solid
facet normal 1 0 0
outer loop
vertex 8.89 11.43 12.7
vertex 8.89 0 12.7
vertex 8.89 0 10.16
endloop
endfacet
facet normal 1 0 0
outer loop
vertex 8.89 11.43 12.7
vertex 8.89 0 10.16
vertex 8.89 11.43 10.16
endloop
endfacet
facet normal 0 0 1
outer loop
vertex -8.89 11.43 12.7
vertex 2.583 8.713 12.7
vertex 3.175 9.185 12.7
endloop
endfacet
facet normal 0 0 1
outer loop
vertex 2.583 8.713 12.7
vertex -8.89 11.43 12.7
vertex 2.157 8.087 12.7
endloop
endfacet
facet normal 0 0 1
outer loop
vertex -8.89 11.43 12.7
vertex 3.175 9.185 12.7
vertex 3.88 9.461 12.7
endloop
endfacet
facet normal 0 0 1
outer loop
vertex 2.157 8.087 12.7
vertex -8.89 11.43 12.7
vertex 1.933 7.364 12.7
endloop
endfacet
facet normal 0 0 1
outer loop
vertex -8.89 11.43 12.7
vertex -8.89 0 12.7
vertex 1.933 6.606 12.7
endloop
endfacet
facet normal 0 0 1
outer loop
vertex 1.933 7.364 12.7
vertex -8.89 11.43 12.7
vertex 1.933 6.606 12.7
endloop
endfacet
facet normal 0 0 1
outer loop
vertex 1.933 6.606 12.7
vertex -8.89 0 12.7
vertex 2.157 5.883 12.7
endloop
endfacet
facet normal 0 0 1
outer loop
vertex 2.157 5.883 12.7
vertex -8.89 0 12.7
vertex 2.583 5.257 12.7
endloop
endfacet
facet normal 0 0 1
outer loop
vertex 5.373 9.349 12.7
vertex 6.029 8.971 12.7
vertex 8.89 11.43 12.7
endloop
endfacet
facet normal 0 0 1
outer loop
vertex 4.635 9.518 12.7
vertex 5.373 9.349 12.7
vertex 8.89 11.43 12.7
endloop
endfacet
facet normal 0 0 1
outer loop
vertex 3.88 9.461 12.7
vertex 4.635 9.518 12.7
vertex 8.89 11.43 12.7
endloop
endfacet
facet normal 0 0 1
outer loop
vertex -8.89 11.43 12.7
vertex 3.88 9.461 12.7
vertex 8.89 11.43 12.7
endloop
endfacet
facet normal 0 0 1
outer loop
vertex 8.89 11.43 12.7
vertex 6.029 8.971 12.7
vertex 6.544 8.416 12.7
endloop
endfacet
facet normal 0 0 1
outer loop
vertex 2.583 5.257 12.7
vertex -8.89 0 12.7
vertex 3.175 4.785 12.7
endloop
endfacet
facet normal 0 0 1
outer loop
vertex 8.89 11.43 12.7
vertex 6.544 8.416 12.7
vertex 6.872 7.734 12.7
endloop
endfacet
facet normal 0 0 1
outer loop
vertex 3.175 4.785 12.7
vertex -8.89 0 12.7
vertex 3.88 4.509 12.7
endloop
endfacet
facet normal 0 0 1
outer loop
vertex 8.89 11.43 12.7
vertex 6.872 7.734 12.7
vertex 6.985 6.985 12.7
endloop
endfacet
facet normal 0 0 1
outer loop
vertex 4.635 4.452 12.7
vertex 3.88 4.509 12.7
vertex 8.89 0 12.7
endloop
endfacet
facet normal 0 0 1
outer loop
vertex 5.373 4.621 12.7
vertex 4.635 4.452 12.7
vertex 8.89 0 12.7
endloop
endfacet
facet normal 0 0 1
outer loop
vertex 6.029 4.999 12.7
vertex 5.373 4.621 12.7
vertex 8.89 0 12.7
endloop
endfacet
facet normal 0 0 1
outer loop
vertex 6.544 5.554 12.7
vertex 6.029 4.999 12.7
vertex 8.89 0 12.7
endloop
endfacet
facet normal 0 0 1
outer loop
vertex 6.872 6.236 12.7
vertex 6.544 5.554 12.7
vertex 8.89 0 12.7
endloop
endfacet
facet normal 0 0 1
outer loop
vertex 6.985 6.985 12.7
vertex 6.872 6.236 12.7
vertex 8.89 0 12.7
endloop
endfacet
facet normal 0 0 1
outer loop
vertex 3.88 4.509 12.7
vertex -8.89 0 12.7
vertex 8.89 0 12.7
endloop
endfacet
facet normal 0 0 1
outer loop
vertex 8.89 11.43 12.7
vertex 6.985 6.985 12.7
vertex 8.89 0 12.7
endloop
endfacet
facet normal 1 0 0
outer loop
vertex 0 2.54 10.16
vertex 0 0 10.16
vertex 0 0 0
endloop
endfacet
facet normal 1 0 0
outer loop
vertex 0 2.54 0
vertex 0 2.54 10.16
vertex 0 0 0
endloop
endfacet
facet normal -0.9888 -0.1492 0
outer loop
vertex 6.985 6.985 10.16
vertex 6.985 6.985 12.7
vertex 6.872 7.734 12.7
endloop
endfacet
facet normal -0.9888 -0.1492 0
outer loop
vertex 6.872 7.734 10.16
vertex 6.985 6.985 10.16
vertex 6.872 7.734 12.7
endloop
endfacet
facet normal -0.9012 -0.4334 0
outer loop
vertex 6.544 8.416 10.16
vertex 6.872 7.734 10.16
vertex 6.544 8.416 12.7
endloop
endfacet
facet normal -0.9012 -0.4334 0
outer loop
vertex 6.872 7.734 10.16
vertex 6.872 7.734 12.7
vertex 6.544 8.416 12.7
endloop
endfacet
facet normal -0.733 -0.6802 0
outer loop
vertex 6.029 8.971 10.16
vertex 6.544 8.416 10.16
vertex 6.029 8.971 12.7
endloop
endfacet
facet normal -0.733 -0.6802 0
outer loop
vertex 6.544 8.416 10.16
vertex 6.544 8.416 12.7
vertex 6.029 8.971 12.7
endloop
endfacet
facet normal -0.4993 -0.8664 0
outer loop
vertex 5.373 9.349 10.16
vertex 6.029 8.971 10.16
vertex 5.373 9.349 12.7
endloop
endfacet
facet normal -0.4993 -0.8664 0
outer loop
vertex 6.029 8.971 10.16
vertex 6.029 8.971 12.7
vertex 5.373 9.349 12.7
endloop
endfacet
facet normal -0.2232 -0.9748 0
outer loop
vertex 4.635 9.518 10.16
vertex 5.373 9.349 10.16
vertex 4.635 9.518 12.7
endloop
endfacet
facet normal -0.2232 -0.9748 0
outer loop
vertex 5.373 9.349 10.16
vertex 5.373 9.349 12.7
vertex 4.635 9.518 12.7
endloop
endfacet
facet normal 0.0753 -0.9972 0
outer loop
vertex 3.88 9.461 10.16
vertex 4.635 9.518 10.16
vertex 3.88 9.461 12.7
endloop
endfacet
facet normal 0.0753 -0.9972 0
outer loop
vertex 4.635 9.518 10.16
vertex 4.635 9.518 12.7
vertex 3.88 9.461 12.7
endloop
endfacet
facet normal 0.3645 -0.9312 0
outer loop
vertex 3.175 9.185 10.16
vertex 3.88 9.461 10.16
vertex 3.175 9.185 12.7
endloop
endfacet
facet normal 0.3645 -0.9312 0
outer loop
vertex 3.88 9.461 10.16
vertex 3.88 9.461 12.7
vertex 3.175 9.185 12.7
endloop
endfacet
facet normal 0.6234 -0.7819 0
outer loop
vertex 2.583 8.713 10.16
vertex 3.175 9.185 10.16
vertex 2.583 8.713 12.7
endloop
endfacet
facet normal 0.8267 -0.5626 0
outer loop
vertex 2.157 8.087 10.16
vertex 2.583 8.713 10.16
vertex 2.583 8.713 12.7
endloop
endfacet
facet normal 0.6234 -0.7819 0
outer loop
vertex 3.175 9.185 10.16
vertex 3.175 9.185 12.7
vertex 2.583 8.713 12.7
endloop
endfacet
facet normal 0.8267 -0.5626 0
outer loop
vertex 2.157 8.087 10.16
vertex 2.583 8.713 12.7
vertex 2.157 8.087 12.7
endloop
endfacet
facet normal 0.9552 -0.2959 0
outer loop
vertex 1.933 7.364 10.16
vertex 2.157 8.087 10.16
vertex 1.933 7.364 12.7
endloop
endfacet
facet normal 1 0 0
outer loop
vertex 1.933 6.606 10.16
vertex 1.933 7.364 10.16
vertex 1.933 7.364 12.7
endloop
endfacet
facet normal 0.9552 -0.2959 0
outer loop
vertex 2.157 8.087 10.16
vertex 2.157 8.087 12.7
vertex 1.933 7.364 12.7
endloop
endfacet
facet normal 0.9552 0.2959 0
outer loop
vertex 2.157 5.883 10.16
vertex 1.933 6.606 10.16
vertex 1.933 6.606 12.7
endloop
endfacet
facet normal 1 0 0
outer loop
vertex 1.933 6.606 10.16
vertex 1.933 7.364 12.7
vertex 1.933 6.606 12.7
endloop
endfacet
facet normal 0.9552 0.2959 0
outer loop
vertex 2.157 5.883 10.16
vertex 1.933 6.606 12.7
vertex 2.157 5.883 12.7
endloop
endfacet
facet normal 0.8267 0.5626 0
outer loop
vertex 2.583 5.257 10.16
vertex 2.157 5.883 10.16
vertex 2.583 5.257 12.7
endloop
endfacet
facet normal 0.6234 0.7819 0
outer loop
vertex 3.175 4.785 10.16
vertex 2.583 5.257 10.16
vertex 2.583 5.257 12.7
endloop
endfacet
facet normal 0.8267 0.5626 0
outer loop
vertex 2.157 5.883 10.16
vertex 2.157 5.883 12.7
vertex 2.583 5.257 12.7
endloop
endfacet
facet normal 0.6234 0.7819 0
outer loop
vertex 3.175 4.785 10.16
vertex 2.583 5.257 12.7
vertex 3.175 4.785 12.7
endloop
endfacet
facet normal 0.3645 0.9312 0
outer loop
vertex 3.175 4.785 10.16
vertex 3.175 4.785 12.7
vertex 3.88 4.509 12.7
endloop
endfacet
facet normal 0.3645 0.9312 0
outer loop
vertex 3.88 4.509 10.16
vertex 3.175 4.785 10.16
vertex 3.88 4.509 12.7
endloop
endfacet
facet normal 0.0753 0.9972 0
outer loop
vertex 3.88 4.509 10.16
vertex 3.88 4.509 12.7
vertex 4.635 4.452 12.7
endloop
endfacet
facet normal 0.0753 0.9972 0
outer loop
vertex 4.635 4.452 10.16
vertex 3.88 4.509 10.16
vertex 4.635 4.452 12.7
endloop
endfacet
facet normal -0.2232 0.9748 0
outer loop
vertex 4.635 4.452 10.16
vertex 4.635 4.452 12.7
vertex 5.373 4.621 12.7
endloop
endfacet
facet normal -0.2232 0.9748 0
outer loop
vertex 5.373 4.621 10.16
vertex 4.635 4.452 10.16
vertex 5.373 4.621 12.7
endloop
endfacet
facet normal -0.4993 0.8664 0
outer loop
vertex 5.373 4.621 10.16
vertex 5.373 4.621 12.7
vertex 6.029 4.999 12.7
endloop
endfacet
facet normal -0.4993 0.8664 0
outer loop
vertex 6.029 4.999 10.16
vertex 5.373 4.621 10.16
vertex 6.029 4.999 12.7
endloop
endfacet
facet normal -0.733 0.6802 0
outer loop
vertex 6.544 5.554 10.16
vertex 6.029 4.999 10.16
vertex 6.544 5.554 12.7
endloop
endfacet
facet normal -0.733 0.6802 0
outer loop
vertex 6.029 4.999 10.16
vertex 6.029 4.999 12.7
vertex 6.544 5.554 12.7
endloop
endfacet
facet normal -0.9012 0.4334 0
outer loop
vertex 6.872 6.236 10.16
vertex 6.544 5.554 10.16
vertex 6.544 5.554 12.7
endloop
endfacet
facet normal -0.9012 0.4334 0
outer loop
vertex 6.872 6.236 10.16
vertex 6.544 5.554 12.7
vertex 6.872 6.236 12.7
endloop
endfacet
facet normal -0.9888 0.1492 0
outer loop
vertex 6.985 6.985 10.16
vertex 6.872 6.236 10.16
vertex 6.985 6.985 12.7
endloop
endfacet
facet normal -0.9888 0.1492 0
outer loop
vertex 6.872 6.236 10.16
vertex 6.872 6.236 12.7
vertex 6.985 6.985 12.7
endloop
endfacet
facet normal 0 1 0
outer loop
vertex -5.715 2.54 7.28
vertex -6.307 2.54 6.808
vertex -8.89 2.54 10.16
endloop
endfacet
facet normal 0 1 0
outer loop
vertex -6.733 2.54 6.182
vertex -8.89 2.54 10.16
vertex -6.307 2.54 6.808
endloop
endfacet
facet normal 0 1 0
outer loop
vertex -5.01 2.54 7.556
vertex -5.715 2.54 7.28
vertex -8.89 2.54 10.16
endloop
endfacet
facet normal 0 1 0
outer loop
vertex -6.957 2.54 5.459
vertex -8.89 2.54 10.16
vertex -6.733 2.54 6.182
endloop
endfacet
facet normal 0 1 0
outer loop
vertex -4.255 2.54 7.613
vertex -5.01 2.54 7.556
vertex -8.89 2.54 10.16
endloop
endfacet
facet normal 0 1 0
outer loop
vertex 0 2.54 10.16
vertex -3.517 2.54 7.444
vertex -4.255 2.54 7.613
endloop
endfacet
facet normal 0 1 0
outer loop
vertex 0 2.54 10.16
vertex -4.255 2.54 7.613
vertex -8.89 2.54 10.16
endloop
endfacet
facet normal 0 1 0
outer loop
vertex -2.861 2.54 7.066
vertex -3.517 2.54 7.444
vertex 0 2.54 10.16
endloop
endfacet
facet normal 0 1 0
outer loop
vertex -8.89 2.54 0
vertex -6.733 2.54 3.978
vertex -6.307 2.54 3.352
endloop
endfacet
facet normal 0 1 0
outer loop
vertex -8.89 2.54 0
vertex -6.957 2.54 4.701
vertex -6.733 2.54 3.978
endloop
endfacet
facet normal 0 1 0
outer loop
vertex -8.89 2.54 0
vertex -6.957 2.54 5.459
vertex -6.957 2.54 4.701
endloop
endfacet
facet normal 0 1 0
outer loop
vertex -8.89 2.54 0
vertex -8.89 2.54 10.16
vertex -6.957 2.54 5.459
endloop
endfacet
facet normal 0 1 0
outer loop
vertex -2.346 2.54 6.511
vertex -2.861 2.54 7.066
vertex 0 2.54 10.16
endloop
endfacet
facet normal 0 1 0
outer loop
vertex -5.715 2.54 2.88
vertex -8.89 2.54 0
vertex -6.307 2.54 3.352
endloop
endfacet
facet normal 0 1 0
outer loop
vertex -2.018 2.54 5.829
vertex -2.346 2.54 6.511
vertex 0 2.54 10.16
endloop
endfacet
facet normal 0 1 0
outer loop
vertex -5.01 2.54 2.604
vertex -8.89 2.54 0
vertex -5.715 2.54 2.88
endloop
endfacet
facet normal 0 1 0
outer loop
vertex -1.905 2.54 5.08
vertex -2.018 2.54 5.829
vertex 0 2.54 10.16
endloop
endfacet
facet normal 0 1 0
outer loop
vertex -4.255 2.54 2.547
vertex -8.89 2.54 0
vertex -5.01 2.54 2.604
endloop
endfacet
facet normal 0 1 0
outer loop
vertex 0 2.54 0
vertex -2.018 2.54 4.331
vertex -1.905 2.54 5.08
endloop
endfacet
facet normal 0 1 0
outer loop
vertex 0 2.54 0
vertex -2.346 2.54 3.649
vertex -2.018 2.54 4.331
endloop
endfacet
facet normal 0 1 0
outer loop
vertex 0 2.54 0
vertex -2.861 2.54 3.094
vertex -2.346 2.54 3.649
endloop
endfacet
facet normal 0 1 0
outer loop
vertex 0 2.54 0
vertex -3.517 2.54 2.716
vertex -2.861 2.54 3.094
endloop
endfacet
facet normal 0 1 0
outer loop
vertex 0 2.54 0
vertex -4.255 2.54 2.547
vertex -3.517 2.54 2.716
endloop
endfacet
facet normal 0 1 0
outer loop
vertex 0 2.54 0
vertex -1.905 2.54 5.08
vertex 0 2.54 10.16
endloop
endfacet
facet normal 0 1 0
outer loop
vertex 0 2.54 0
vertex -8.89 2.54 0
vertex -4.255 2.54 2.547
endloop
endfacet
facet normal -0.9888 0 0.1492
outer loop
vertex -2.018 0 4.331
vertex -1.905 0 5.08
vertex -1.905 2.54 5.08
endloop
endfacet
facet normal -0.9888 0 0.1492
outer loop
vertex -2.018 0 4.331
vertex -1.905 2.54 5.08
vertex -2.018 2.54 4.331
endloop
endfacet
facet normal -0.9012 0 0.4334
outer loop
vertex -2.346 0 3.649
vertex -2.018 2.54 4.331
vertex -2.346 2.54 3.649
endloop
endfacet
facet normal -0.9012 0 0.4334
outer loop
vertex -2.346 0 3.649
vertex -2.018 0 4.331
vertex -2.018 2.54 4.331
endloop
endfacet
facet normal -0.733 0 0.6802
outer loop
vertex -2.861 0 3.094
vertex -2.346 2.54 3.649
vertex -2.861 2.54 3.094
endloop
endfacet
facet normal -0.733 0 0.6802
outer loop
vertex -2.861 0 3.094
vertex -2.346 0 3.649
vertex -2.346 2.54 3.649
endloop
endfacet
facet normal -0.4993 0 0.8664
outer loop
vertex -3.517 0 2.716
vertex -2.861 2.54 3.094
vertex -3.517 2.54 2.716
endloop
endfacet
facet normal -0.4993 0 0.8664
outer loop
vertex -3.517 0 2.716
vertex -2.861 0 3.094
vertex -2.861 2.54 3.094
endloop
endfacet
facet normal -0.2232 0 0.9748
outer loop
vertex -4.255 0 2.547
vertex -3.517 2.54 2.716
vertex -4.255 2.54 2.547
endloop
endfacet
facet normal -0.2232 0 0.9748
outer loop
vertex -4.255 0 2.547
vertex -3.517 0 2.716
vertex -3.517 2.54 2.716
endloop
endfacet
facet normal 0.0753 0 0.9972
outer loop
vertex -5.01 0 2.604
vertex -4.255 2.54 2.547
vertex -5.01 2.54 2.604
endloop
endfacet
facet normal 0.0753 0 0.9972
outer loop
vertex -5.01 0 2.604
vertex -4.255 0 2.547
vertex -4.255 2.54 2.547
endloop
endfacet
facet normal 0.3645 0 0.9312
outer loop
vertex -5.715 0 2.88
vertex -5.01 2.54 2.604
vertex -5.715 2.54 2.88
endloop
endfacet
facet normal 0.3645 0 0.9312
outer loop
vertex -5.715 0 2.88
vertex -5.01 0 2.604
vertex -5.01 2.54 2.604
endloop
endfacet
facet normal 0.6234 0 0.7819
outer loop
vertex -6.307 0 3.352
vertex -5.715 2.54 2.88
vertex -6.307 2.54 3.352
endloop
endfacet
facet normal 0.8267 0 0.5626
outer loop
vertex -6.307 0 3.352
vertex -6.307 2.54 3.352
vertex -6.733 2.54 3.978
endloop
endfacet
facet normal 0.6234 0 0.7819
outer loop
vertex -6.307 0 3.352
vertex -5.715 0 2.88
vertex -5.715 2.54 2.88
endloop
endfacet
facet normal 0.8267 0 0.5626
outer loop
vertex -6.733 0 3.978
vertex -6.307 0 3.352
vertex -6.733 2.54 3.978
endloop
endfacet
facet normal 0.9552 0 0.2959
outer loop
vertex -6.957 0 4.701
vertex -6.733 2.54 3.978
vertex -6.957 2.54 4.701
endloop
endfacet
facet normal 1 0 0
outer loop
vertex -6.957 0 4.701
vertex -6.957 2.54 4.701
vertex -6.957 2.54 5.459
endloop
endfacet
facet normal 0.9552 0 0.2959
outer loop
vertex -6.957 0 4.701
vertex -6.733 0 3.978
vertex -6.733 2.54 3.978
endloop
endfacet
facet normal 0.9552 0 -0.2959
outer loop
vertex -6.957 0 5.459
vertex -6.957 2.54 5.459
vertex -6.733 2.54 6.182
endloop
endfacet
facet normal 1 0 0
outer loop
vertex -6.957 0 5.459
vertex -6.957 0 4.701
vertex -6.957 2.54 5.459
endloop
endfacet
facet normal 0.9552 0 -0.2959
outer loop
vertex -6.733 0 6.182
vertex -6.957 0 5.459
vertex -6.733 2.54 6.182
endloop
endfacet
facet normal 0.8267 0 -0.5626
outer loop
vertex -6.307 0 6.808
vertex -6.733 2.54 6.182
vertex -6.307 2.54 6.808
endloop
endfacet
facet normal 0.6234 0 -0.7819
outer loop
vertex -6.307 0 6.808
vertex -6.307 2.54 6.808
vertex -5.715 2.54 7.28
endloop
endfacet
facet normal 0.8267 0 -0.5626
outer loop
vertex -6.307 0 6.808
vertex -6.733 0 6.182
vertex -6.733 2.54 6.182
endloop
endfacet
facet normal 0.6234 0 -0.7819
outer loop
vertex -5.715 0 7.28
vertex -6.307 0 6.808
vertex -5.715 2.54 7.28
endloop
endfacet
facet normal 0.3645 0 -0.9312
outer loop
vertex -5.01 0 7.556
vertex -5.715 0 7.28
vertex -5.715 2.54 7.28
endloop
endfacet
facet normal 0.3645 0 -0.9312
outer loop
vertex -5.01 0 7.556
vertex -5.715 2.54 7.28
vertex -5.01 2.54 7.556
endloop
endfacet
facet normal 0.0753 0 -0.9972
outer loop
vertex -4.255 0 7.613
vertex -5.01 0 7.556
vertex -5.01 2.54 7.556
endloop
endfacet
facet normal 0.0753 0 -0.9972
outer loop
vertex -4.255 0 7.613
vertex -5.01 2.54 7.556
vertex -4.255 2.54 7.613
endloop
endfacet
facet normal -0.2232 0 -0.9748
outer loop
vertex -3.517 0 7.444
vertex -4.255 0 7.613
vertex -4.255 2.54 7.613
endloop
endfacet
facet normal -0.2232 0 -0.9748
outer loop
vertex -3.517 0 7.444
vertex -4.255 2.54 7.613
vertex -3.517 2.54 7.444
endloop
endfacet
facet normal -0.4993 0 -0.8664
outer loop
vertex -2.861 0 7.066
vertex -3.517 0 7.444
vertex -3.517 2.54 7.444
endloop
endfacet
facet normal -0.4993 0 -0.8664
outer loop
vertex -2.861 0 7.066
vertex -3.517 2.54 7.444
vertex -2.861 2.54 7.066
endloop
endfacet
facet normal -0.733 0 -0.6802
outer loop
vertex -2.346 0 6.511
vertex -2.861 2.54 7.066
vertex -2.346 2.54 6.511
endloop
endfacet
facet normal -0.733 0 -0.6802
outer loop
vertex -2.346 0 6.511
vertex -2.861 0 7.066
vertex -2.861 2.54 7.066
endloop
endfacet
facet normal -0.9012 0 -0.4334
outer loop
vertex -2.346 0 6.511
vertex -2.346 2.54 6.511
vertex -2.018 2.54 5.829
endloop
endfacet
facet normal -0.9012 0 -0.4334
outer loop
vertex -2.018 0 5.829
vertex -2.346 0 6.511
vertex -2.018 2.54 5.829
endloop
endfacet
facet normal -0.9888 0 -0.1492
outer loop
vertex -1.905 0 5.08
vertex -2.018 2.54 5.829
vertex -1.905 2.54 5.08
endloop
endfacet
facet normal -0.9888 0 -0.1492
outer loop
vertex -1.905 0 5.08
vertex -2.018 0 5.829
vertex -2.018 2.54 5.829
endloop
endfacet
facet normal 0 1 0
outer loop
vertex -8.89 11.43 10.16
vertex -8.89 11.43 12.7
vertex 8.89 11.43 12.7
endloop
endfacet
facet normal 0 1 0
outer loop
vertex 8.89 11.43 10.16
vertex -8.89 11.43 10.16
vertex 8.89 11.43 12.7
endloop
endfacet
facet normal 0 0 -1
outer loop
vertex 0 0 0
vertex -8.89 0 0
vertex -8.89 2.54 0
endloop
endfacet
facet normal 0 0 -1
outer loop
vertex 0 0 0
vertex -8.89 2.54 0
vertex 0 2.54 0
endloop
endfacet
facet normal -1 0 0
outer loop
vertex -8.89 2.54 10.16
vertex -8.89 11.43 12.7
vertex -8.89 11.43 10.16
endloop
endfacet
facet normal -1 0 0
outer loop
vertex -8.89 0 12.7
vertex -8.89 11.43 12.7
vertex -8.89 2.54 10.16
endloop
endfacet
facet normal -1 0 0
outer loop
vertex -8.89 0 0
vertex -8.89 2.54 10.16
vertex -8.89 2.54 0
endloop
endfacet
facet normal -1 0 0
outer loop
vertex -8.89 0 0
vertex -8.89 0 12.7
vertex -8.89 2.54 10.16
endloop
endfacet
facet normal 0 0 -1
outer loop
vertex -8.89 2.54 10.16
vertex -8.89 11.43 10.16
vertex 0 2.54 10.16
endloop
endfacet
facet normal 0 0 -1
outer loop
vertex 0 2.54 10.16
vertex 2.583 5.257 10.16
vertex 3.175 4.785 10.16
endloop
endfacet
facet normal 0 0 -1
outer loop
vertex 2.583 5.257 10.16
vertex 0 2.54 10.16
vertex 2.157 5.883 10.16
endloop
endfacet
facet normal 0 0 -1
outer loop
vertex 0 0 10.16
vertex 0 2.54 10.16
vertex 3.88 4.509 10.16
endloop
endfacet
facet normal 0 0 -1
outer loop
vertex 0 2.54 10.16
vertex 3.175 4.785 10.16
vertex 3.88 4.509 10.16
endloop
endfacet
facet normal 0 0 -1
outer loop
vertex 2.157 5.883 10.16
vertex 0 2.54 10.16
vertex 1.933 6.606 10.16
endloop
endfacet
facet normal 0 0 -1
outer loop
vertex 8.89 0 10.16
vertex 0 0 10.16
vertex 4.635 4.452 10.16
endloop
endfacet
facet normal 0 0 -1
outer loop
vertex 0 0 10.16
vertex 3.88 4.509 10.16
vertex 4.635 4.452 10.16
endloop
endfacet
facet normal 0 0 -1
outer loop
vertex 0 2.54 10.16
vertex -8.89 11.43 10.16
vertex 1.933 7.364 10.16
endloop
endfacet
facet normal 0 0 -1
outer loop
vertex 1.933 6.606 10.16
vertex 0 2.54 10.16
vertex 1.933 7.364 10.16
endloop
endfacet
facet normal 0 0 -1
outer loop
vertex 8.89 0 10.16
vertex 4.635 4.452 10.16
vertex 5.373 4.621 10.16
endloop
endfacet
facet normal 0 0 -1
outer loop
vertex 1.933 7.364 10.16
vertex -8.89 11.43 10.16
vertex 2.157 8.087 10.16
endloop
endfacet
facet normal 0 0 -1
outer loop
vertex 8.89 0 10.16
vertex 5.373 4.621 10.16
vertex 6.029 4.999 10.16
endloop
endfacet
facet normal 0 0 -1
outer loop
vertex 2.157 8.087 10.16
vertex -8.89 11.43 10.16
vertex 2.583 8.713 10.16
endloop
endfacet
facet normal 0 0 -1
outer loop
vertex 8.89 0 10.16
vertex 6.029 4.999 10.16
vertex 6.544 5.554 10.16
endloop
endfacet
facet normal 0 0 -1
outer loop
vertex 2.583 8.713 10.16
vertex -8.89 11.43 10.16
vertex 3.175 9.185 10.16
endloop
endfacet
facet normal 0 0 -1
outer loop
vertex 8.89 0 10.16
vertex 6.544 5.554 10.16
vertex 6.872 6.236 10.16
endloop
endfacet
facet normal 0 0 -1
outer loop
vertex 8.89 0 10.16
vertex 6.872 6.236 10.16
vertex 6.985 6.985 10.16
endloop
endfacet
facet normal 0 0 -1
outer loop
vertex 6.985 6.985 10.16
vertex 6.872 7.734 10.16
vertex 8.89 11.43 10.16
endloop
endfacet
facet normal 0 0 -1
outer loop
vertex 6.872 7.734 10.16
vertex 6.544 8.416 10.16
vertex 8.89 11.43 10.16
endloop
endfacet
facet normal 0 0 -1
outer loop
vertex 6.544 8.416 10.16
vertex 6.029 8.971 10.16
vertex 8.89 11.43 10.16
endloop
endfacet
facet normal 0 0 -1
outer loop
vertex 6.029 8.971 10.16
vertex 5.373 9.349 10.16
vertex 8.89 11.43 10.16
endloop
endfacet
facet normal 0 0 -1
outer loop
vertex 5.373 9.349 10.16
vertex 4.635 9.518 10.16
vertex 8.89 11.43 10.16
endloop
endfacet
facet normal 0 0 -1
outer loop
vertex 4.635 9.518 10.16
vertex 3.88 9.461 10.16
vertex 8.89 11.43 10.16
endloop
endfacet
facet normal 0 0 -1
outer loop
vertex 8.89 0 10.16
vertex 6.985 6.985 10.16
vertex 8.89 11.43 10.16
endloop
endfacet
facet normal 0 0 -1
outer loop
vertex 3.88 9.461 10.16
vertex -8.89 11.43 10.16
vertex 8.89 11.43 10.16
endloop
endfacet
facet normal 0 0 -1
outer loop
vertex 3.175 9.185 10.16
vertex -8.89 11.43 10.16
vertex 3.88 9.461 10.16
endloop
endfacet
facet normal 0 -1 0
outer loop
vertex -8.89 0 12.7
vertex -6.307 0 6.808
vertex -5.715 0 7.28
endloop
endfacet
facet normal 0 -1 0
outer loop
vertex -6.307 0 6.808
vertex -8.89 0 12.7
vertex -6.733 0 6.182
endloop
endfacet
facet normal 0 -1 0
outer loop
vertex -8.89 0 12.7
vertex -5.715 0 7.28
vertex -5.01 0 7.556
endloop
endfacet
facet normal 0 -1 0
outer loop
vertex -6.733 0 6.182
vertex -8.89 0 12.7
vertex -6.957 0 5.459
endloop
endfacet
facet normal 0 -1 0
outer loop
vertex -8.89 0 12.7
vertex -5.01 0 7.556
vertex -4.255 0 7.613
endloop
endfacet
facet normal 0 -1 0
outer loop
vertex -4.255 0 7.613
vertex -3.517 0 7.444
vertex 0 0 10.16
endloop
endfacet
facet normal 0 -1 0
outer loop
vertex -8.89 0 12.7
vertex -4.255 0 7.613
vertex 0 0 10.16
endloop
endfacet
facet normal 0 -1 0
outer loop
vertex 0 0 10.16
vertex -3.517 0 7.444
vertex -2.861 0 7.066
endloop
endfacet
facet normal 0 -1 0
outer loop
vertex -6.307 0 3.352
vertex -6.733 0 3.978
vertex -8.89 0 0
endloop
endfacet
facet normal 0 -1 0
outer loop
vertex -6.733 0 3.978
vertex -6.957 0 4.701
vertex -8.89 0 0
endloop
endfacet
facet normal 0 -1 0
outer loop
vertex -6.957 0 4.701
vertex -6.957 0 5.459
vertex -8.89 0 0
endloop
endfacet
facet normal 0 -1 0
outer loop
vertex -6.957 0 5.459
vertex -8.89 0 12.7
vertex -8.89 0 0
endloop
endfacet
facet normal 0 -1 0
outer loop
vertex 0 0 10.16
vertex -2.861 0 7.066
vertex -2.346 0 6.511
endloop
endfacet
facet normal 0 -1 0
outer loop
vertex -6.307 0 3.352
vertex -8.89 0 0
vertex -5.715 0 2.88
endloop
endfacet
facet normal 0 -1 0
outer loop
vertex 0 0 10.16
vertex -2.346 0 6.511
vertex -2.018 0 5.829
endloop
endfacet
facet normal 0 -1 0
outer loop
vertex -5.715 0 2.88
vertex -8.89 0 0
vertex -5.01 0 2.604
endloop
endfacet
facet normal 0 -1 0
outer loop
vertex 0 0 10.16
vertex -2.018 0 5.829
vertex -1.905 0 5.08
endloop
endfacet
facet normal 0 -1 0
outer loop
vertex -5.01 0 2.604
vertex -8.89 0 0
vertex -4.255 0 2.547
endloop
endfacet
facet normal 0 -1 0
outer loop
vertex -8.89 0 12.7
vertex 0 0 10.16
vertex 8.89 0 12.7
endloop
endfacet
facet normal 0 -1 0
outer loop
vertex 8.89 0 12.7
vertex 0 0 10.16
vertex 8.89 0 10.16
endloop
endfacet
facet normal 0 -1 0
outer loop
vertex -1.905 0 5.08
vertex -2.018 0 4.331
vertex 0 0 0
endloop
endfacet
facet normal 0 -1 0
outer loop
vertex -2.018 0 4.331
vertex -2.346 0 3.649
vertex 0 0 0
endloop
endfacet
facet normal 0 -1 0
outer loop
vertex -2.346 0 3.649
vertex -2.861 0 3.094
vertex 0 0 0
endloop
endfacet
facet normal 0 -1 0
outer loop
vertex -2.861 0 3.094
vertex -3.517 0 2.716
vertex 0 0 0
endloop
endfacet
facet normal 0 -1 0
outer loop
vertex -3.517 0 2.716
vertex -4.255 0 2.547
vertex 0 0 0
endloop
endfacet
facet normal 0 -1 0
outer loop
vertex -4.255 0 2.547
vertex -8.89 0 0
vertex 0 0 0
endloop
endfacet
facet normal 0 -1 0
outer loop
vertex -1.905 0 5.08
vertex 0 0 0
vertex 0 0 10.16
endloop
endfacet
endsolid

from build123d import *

# Parameters (mm, degrees)
SKETCH1_W           = 8.89
SKETCH1_H           = 12.7
SKETCH1_R           = 2.54
BOSS_EXTRUDE1_DEPTH = 2.54
SKETCH2_W           = 17.78
SKETCH2_H           = 11.43
SKETCH2_R           = 2.54
BOSS_EXTRUDE2_DEPTH = 2.54


with BuildPart() as part:
    # Sketch1 → Boss-Extrude1 (new body)
    with BuildSketch(Plane(origin=(0, 0, 0), x_dir=(1, 0, 0), z_dir=(0, 1, 0))):
        with Locations((-4.445, -6.35)):
            Rectangle(SKETCH1_W, SKETCH1_H)
        with Locations((-4.445, -5.08)):
            Circle(SKETCH1_R, mode=Mode.SUBTRACT)
    extrude(amount=BOSS_EXTRUDE1_DEPTH)

    # Sketch2 → Boss-Extrude2 (add)
    with BuildSketch(Plane.XY.offset(12.7)):
        with Locations((0, 5.715)):
            Rectangle(SKETCH2_W, SKETCH2_H)
        with Locations((4.445, 6.985)):
            Circle(SKETCH2_R, mode=Mode.SUBTRACT)
    extrude(amount=-BOSS_EXTRUDE2_DEPTH)


solid = part.part
